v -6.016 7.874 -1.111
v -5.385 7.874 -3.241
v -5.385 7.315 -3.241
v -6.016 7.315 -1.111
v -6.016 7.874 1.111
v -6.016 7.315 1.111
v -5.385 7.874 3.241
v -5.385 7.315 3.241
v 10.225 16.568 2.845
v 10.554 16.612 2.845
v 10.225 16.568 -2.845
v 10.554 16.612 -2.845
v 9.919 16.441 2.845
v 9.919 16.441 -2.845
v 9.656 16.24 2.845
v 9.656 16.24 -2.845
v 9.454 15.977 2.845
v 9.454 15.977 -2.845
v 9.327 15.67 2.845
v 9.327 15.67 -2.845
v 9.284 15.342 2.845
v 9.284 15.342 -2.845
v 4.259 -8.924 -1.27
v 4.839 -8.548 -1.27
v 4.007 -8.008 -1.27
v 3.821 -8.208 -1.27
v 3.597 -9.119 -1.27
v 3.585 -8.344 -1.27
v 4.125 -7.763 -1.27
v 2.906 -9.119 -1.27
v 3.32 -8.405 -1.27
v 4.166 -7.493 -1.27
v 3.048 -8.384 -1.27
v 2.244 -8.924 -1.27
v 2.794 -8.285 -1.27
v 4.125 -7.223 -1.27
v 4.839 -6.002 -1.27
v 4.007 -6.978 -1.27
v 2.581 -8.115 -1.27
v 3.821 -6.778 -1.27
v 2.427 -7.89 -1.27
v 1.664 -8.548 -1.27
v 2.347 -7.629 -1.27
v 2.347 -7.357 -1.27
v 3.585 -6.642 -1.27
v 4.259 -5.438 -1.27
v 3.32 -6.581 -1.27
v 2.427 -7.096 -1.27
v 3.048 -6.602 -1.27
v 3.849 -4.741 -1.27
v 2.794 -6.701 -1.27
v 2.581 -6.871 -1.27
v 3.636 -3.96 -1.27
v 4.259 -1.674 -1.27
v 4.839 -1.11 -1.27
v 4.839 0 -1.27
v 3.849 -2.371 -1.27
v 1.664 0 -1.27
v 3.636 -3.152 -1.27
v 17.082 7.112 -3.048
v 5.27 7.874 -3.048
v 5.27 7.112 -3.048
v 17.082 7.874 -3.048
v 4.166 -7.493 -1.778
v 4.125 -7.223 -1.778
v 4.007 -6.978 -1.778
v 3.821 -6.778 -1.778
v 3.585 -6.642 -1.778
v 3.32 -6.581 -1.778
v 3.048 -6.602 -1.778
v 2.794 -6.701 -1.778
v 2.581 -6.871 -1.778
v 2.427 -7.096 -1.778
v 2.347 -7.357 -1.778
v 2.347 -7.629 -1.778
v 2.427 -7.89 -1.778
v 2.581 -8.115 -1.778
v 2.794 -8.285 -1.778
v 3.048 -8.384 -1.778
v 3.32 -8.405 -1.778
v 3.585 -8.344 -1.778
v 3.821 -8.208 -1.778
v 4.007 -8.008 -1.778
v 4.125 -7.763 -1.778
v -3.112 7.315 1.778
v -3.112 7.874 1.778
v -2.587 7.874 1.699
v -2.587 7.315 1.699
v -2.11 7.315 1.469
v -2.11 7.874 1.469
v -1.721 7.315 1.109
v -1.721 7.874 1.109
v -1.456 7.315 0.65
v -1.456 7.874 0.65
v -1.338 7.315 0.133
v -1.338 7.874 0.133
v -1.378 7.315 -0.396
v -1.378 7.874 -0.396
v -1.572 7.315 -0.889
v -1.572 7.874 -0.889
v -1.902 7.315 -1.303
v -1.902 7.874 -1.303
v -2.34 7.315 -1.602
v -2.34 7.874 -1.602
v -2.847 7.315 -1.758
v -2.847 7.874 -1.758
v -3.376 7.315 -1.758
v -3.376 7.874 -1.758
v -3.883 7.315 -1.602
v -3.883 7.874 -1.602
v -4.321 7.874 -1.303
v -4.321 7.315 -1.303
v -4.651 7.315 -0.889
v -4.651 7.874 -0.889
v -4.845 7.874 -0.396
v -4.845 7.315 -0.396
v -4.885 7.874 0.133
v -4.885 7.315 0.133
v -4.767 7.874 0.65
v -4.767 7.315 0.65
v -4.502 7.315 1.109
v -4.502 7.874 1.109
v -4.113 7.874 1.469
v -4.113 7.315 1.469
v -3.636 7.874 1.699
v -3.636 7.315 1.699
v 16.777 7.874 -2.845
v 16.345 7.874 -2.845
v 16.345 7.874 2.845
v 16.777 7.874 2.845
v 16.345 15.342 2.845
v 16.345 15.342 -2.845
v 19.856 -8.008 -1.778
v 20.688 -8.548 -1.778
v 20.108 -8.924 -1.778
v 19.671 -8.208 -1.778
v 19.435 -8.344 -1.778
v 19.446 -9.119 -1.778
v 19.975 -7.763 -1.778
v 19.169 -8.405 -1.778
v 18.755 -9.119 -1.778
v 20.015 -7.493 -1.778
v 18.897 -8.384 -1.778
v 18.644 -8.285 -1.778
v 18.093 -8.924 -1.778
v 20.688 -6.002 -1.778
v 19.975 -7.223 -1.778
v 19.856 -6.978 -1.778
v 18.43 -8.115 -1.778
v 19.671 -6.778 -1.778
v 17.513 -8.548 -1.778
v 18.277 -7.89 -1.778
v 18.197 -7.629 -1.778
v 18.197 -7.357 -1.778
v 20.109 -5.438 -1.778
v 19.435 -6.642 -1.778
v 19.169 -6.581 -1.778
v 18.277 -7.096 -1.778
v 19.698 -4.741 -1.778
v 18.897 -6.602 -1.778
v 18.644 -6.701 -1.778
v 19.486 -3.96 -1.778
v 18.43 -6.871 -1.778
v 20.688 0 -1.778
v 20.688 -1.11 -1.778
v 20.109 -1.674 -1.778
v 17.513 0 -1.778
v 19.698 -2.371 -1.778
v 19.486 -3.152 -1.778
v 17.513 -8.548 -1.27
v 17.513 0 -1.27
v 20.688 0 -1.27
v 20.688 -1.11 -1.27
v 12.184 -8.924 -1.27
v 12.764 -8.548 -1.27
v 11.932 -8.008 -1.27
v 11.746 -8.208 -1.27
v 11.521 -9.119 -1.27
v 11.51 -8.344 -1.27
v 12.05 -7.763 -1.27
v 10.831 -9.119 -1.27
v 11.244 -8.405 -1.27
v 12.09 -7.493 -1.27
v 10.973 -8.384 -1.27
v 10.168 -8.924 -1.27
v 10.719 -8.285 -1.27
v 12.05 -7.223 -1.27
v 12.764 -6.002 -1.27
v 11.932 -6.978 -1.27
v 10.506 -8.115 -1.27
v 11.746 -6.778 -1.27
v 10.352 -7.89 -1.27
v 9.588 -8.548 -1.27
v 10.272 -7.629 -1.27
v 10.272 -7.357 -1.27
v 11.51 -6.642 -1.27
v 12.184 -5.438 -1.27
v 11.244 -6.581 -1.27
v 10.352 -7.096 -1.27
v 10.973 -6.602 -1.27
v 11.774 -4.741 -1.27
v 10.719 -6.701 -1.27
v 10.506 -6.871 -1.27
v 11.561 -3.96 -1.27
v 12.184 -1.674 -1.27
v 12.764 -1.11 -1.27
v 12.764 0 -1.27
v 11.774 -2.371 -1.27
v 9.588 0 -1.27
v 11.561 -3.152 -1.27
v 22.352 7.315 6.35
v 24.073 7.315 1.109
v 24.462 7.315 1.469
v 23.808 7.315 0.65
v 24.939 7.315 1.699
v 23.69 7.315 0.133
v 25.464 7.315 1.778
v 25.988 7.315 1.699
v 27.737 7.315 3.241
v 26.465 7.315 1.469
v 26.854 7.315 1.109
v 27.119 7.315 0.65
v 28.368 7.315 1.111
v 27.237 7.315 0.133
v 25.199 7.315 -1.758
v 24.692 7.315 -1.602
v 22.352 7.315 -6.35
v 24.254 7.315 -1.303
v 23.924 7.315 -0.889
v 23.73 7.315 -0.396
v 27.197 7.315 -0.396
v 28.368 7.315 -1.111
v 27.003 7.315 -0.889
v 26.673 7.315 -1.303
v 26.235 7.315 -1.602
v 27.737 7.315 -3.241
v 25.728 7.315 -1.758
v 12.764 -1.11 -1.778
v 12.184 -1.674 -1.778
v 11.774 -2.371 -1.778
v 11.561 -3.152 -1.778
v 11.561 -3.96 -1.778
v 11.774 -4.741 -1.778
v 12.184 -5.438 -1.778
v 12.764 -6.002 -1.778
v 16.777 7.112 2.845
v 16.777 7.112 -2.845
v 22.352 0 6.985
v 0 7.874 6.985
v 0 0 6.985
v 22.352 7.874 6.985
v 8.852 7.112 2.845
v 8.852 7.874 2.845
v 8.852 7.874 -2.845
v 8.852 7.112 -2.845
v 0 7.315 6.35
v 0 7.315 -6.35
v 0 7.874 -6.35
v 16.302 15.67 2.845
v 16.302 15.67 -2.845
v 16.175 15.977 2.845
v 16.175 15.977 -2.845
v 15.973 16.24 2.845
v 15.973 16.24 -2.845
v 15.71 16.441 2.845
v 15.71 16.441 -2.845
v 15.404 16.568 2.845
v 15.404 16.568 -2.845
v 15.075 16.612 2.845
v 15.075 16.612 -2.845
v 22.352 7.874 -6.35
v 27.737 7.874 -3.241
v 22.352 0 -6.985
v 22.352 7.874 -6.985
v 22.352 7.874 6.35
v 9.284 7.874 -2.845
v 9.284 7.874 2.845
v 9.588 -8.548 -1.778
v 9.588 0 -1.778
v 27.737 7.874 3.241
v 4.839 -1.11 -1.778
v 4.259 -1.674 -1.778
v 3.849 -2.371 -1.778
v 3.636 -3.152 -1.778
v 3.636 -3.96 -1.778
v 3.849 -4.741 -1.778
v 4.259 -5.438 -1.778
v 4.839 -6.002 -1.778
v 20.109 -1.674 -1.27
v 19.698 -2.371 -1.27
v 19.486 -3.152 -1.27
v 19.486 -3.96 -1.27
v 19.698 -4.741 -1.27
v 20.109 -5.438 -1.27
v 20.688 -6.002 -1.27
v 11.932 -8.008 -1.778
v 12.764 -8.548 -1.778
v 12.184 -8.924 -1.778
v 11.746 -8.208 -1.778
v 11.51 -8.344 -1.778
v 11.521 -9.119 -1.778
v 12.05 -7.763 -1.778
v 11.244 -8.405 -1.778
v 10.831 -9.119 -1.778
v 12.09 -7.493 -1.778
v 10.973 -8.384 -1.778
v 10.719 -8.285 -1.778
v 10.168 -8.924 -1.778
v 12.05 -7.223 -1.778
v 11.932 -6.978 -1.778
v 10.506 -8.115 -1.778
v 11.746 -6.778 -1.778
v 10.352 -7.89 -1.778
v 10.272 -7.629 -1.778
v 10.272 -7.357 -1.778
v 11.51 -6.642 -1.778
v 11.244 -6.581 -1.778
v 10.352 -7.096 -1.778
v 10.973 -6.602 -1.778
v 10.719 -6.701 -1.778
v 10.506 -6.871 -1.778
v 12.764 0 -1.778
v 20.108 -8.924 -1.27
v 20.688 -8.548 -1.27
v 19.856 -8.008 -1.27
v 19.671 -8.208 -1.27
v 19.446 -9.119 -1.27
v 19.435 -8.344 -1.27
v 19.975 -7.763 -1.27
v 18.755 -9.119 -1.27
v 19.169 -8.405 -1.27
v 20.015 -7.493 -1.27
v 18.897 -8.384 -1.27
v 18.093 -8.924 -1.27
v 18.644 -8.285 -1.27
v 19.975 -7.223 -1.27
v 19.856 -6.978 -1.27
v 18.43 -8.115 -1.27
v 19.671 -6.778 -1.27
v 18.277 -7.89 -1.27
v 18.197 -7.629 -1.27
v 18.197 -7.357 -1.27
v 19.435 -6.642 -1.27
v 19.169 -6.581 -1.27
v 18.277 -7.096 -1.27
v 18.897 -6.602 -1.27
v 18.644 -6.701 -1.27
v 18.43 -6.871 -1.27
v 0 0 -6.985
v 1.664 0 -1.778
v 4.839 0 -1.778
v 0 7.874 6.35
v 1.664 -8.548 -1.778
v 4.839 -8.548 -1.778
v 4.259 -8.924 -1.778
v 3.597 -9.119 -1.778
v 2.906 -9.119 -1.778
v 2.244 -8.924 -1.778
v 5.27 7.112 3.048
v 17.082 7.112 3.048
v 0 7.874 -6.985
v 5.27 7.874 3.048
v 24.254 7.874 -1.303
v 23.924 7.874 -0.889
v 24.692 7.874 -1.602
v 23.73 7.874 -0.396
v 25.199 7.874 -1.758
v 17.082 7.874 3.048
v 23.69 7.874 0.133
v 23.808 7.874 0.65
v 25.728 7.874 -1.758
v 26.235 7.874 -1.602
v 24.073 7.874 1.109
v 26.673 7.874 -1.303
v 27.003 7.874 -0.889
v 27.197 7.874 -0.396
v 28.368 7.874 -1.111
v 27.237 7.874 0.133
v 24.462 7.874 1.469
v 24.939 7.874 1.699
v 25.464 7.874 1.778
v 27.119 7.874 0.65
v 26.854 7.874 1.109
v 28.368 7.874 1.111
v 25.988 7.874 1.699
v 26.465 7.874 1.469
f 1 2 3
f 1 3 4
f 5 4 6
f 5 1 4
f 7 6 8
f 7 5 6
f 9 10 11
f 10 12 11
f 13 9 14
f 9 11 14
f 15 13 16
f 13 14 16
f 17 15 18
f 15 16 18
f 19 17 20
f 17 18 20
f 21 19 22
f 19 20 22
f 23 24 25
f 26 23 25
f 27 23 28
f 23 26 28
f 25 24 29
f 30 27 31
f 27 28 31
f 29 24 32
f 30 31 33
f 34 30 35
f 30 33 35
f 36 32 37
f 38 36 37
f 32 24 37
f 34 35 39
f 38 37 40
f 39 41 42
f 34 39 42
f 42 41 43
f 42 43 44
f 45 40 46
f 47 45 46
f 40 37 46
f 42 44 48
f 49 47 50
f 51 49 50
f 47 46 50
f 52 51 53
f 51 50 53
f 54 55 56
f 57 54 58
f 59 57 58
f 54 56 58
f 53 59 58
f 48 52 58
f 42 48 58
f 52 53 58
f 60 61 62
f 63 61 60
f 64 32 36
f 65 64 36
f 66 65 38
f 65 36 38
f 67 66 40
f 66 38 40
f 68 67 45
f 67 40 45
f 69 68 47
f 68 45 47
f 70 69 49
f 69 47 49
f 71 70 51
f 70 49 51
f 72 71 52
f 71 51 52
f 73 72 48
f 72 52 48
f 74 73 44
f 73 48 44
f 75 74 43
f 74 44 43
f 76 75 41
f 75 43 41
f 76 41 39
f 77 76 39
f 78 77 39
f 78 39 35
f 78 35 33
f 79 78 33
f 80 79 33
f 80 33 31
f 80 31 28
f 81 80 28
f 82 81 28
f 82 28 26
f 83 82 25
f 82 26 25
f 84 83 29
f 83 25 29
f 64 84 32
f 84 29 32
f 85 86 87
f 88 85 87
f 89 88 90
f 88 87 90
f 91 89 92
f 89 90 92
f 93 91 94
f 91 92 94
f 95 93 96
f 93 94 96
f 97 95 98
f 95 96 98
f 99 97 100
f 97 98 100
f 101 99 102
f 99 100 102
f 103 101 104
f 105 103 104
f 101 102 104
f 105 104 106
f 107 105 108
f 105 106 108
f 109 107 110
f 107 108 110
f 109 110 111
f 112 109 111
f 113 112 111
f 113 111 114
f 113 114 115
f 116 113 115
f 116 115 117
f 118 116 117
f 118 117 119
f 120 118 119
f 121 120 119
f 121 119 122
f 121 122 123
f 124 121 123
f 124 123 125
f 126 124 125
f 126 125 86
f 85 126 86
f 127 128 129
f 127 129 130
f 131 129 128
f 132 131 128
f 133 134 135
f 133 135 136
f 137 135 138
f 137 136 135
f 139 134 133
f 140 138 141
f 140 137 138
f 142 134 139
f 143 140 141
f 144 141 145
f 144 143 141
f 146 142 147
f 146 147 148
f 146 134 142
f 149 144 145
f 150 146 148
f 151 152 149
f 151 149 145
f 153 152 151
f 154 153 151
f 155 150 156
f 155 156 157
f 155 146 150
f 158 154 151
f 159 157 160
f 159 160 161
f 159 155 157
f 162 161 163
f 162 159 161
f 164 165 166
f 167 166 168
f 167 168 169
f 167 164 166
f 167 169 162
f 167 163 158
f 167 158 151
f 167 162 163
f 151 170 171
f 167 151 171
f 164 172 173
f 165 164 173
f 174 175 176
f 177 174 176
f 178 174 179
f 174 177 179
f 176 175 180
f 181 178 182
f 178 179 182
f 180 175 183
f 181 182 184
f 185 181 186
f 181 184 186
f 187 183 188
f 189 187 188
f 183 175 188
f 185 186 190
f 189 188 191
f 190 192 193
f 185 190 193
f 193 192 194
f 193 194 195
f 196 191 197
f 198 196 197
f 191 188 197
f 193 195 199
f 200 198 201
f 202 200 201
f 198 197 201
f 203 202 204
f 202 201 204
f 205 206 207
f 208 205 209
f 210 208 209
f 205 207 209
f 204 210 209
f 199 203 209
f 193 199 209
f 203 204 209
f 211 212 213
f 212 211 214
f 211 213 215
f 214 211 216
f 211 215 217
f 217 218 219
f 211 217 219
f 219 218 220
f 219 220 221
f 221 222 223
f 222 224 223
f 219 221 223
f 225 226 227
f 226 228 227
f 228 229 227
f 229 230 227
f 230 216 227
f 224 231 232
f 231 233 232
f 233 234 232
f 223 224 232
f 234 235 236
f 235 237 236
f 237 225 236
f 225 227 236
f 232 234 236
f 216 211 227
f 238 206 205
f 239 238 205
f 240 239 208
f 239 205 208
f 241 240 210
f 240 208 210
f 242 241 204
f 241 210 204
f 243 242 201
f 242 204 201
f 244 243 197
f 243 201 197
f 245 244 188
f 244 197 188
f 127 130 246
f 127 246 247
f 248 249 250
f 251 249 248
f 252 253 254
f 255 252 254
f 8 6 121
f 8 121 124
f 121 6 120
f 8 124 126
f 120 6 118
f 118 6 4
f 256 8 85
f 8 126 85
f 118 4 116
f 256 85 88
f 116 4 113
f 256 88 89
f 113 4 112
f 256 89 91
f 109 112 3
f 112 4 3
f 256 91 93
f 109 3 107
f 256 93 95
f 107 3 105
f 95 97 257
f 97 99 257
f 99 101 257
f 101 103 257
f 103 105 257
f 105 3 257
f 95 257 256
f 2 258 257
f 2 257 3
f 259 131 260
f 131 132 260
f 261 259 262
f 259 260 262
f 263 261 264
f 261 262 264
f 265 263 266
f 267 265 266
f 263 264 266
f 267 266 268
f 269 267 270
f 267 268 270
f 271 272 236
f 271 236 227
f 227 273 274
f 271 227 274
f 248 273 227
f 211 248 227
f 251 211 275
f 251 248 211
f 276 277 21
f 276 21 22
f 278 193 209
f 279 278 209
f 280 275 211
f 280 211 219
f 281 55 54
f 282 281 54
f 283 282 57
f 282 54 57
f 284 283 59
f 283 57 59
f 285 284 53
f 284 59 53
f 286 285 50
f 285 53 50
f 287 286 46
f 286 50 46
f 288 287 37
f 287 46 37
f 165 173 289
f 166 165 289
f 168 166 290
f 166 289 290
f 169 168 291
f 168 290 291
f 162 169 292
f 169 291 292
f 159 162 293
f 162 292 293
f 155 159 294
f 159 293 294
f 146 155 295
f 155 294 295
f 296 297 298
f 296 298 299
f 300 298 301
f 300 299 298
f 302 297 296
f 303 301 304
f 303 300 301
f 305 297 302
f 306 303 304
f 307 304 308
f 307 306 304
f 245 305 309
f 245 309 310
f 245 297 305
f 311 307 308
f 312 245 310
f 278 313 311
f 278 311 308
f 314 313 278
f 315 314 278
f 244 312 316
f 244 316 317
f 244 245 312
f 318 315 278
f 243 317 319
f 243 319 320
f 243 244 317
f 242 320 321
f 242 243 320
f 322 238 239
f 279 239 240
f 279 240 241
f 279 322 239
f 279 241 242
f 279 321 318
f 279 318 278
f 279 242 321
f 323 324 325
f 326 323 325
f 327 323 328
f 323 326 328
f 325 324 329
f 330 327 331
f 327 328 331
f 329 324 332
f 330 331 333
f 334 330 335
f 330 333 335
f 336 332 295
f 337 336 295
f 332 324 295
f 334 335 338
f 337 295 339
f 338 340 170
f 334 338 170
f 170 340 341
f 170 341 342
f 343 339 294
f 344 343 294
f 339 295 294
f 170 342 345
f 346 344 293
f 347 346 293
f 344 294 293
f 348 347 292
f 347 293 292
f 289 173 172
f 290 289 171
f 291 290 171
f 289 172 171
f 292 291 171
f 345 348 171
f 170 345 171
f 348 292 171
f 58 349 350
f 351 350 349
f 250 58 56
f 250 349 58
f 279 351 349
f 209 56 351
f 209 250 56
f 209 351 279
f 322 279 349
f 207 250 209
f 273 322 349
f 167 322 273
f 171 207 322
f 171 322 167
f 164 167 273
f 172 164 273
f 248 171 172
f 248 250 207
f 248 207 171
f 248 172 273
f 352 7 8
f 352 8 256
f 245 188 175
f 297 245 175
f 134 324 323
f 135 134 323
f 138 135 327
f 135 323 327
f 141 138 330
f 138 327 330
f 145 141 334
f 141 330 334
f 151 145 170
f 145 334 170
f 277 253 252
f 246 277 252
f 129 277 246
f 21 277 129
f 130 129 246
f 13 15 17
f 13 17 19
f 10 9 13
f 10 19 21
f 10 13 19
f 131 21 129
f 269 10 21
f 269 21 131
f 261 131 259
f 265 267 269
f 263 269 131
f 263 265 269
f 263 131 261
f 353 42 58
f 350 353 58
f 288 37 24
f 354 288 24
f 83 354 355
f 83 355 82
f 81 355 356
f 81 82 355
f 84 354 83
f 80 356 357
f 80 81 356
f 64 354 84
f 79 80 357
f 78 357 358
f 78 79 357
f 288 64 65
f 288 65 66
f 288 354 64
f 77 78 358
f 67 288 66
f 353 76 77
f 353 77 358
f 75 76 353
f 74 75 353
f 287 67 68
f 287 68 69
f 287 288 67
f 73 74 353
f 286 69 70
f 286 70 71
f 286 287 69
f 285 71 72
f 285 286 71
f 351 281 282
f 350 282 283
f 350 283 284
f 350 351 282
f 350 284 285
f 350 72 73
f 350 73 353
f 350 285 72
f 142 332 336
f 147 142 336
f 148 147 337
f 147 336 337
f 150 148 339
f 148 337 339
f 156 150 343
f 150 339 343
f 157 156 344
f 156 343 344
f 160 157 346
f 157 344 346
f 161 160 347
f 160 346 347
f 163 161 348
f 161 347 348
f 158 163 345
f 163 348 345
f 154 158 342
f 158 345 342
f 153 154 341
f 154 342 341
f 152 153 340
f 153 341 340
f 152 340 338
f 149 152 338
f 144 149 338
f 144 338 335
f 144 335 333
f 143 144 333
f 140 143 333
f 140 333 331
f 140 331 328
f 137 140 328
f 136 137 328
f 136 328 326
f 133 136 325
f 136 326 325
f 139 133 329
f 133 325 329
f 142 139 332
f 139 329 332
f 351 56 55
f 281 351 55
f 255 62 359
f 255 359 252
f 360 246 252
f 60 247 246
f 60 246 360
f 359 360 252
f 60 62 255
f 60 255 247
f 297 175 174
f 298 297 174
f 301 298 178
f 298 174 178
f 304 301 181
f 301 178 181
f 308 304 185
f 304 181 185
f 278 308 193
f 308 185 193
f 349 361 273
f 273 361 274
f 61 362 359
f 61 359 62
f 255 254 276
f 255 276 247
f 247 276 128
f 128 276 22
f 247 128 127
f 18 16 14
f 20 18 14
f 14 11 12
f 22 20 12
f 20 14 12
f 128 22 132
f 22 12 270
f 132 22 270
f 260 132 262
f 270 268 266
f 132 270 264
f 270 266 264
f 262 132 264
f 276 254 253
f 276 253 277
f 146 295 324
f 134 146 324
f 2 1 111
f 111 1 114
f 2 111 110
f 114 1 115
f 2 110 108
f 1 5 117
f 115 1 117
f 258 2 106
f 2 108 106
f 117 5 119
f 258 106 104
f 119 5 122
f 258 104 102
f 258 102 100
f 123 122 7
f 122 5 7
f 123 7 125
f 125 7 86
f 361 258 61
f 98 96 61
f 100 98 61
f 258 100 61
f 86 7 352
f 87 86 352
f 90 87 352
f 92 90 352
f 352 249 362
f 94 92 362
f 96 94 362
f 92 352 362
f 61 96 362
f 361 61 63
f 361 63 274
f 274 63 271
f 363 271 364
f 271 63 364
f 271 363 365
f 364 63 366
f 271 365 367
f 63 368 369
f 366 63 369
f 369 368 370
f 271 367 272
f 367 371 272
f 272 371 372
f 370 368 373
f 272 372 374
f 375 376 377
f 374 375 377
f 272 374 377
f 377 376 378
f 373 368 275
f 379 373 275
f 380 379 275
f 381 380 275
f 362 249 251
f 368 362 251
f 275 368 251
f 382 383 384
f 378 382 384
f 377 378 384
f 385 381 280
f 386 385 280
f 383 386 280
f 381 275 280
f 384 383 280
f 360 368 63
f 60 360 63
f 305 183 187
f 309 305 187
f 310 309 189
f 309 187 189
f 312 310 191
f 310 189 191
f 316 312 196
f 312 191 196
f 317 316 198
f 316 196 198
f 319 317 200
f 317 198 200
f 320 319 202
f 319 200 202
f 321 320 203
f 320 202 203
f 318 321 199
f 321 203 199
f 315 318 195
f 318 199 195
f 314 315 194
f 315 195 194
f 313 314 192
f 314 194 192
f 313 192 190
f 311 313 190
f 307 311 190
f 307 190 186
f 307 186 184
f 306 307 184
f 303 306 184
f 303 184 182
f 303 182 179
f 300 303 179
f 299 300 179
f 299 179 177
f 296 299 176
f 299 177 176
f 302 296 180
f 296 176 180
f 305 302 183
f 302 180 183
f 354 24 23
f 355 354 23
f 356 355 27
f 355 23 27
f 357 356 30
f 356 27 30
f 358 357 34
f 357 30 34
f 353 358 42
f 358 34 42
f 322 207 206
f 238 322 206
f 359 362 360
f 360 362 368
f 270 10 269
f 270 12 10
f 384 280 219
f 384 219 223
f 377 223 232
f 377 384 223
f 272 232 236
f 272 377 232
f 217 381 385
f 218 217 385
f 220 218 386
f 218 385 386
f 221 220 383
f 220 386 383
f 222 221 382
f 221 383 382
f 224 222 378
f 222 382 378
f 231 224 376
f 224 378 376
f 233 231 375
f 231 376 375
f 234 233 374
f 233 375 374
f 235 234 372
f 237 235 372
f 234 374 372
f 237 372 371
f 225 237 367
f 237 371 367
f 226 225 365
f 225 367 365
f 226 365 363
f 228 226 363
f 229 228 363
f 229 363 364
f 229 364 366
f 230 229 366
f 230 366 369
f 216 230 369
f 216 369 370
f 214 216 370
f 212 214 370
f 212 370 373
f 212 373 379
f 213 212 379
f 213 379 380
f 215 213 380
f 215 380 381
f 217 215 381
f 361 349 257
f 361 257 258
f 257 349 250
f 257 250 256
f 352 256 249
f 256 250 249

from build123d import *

# Parameters (mm, degrees)
SKETCH1_W       = 22.352
SKETCH1_H       = 7.874
EXTRUDE1_DEPTH  = 6.985
EXTRUDE2_DEPTH  = 0.5588
SKETCH3_W       = 11.811
SKETCH3_H       = 6.096
EXTRUDE3_DEPTH  = 0.762
SKETCH4_W       = 7.0612
SKETCH4_H       = 5.6896
EXTRUDE4_DEPTH  = 9.4996
SKETCH7_W       = 7.9248
SKETCH7_H       = 5.6896
EXTRUDE7_DEPTH  = 0.762
FILLET2_R       = 1.27
SKETCH5_R       = 1.778
EXTRUDE5_DEPTH  = 9.4996
SKETCH6_R       = 0.9144
EXTRUDE6_DEPTH  = 0.508
LPATTERN1_COUNT = 2
LPATTERN1_PITCH = 7.9248
LPATTERN2_COUNT = 2
LPATTERN2_PITCH = 7.9248


with BuildPart() as part:
    # Sketch1 → Extrude1 (new, symmetric)
    with BuildSketch(Plane.XY):
        with Locations((11.176, 3.937)):
            Rectangle(SKETCH1_W, SKETCH1_H)
    extrude(amount=EXTRUDE1_DEPTH, both=True)

    # Sketch2 → Extrude2 (add)
    with BuildSketch(Plane(origin=(0, 7.874, 0), x_dir=(1, 0, 0), z_dir=(0, 1, 0))):
        with BuildLine():
            Line((0, 6.35), (-5.3848, 3.24108427))
            ThreePointArc((-5.3848, 3.24108427), (-6.096, 0), (-5.3848, -3.24108427))
            Line((-5.3848, -3.24108427), (0, -6.35))
            Line((0, -6.35), (0, 6.35))
        make_face()
        with BuildLine():
            Line((22.352, 6.35), (22.352, -6.35))
            Line((22.352, -6.35), (27.7368, -3.24108427))
            ThreePointArc((27.7368, -3.24108427), (28.448, 0), (27.7368, 3.24108427))
            Line((27.7368, 3.24108427), (22.352, 6.35))
        make_face()
    extrude(amount=-EXTRUDE2_DEPTH)

    # Sketch3 → Extrude3 (cut)
    with BuildSketch(Plane(origin=(0, 7.874, 0), x_dir=(1, 0, 0), z_dir=(0, 1, 0))):
        with Locations((11.176, 0)):
            Rectangle(SKETCH3_W, SKETCH3_H)
    extrude(amount=-EXTRUDE3_DEPTH, mode=Mode.SUBTRACT)

    # Sketch4 → Extrude4 (add)
    with BuildSketch(Plane(origin=(0, 7.112, 0), x_dir=(1, 0, 0), z_dir=(0, 1, 0))):
        with Locations((12.8143, 0)):
            Rectangle(SKETCH4_W, SKETCH4_H)
    extrude(amount=EXTRUDE4_DEPTH)

    # Sketch7 → Extrude7 (add)
    with BuildSketch(Plane(origin=(0, 7.874, 0), x_dir=(1, 0, 0), z_dir=(0, 1, 0))):
        with Locations((12.8143, 0)):
            Rectangle(SKETCH7_W, SKETCH7_H)
    extrude(amount=-EXTRUDE7_DEPTH)

    # Fillet2
    fillet2_edges = [part.edges().sort_by_distance(p)[0] for p in [
        (9.2837, 16.6116, 0),
        (16.3449, 16.6116, 0),
    ]]
    fillet(fillet2_edges, radius=FILLET2_R)

    # Sketch5 → Extrude5 (cut)
    with BuildSketch(Plane(origin=(0, 7.874, 0), x_dir=(1, 0, 0), z_dir=(0, 1, 0))):
        with Locations(Location((-3.1115, 0, 0), (0, 0, 270))):
            Circle(SKETCH5_R)
        with Locations(Location((25.4635, 0, 0), (0, 0, 270))):
            Circle(SKETCH5_R)
    extrude(amount=-EXTRUDE5_DEPTH, mode=Mode.SUBTRACT)

    # Sketch6 → Extrude6 (add)
    with BuildSketch(Plane.XY.offset(-1.27)):
        with BuildLine():
            Line((12.7635, -6.00209581), (12.7635, -8.548254179))
            ThreePointArc((12.7635, -8.548254179), (11.176, -9.144), (9.5885, -8.548254179))
            Line((9.5885, -8.548254179), (9.5885, 0))
            Line((9.5885, 0), (12.7635, 0))
            Line((12.7635, 0), (12.7635, -1.10990419))
            ThreePointArc((12.7635, -1.10990419), (11.533993687, -3.556), (12.7635, -6.00209581))
        make_face()
        with Locations((11.176, -7.493)):
            Circle(SKETCH6_R, mode=Mode.SUBTRACT)
    extrude6 = extrude(amount=-EXTRUDE6_DEPTH)

    # LPattern1: Extrude6 ×2
    with Locations(*[(i * LPATTERN1_PITCH, 0, 0) for i in range(1, LPATTERN1_COUNT)]):
        add(extrude6)

    # LPattern2: Extrude6 ×2
    with Locations(*[(-i * LPATTERN2_PITCH, 0, 0) for i in range(1, LPATTERN2_COUNT)]):
        add(extrude6)


solid = part.part
